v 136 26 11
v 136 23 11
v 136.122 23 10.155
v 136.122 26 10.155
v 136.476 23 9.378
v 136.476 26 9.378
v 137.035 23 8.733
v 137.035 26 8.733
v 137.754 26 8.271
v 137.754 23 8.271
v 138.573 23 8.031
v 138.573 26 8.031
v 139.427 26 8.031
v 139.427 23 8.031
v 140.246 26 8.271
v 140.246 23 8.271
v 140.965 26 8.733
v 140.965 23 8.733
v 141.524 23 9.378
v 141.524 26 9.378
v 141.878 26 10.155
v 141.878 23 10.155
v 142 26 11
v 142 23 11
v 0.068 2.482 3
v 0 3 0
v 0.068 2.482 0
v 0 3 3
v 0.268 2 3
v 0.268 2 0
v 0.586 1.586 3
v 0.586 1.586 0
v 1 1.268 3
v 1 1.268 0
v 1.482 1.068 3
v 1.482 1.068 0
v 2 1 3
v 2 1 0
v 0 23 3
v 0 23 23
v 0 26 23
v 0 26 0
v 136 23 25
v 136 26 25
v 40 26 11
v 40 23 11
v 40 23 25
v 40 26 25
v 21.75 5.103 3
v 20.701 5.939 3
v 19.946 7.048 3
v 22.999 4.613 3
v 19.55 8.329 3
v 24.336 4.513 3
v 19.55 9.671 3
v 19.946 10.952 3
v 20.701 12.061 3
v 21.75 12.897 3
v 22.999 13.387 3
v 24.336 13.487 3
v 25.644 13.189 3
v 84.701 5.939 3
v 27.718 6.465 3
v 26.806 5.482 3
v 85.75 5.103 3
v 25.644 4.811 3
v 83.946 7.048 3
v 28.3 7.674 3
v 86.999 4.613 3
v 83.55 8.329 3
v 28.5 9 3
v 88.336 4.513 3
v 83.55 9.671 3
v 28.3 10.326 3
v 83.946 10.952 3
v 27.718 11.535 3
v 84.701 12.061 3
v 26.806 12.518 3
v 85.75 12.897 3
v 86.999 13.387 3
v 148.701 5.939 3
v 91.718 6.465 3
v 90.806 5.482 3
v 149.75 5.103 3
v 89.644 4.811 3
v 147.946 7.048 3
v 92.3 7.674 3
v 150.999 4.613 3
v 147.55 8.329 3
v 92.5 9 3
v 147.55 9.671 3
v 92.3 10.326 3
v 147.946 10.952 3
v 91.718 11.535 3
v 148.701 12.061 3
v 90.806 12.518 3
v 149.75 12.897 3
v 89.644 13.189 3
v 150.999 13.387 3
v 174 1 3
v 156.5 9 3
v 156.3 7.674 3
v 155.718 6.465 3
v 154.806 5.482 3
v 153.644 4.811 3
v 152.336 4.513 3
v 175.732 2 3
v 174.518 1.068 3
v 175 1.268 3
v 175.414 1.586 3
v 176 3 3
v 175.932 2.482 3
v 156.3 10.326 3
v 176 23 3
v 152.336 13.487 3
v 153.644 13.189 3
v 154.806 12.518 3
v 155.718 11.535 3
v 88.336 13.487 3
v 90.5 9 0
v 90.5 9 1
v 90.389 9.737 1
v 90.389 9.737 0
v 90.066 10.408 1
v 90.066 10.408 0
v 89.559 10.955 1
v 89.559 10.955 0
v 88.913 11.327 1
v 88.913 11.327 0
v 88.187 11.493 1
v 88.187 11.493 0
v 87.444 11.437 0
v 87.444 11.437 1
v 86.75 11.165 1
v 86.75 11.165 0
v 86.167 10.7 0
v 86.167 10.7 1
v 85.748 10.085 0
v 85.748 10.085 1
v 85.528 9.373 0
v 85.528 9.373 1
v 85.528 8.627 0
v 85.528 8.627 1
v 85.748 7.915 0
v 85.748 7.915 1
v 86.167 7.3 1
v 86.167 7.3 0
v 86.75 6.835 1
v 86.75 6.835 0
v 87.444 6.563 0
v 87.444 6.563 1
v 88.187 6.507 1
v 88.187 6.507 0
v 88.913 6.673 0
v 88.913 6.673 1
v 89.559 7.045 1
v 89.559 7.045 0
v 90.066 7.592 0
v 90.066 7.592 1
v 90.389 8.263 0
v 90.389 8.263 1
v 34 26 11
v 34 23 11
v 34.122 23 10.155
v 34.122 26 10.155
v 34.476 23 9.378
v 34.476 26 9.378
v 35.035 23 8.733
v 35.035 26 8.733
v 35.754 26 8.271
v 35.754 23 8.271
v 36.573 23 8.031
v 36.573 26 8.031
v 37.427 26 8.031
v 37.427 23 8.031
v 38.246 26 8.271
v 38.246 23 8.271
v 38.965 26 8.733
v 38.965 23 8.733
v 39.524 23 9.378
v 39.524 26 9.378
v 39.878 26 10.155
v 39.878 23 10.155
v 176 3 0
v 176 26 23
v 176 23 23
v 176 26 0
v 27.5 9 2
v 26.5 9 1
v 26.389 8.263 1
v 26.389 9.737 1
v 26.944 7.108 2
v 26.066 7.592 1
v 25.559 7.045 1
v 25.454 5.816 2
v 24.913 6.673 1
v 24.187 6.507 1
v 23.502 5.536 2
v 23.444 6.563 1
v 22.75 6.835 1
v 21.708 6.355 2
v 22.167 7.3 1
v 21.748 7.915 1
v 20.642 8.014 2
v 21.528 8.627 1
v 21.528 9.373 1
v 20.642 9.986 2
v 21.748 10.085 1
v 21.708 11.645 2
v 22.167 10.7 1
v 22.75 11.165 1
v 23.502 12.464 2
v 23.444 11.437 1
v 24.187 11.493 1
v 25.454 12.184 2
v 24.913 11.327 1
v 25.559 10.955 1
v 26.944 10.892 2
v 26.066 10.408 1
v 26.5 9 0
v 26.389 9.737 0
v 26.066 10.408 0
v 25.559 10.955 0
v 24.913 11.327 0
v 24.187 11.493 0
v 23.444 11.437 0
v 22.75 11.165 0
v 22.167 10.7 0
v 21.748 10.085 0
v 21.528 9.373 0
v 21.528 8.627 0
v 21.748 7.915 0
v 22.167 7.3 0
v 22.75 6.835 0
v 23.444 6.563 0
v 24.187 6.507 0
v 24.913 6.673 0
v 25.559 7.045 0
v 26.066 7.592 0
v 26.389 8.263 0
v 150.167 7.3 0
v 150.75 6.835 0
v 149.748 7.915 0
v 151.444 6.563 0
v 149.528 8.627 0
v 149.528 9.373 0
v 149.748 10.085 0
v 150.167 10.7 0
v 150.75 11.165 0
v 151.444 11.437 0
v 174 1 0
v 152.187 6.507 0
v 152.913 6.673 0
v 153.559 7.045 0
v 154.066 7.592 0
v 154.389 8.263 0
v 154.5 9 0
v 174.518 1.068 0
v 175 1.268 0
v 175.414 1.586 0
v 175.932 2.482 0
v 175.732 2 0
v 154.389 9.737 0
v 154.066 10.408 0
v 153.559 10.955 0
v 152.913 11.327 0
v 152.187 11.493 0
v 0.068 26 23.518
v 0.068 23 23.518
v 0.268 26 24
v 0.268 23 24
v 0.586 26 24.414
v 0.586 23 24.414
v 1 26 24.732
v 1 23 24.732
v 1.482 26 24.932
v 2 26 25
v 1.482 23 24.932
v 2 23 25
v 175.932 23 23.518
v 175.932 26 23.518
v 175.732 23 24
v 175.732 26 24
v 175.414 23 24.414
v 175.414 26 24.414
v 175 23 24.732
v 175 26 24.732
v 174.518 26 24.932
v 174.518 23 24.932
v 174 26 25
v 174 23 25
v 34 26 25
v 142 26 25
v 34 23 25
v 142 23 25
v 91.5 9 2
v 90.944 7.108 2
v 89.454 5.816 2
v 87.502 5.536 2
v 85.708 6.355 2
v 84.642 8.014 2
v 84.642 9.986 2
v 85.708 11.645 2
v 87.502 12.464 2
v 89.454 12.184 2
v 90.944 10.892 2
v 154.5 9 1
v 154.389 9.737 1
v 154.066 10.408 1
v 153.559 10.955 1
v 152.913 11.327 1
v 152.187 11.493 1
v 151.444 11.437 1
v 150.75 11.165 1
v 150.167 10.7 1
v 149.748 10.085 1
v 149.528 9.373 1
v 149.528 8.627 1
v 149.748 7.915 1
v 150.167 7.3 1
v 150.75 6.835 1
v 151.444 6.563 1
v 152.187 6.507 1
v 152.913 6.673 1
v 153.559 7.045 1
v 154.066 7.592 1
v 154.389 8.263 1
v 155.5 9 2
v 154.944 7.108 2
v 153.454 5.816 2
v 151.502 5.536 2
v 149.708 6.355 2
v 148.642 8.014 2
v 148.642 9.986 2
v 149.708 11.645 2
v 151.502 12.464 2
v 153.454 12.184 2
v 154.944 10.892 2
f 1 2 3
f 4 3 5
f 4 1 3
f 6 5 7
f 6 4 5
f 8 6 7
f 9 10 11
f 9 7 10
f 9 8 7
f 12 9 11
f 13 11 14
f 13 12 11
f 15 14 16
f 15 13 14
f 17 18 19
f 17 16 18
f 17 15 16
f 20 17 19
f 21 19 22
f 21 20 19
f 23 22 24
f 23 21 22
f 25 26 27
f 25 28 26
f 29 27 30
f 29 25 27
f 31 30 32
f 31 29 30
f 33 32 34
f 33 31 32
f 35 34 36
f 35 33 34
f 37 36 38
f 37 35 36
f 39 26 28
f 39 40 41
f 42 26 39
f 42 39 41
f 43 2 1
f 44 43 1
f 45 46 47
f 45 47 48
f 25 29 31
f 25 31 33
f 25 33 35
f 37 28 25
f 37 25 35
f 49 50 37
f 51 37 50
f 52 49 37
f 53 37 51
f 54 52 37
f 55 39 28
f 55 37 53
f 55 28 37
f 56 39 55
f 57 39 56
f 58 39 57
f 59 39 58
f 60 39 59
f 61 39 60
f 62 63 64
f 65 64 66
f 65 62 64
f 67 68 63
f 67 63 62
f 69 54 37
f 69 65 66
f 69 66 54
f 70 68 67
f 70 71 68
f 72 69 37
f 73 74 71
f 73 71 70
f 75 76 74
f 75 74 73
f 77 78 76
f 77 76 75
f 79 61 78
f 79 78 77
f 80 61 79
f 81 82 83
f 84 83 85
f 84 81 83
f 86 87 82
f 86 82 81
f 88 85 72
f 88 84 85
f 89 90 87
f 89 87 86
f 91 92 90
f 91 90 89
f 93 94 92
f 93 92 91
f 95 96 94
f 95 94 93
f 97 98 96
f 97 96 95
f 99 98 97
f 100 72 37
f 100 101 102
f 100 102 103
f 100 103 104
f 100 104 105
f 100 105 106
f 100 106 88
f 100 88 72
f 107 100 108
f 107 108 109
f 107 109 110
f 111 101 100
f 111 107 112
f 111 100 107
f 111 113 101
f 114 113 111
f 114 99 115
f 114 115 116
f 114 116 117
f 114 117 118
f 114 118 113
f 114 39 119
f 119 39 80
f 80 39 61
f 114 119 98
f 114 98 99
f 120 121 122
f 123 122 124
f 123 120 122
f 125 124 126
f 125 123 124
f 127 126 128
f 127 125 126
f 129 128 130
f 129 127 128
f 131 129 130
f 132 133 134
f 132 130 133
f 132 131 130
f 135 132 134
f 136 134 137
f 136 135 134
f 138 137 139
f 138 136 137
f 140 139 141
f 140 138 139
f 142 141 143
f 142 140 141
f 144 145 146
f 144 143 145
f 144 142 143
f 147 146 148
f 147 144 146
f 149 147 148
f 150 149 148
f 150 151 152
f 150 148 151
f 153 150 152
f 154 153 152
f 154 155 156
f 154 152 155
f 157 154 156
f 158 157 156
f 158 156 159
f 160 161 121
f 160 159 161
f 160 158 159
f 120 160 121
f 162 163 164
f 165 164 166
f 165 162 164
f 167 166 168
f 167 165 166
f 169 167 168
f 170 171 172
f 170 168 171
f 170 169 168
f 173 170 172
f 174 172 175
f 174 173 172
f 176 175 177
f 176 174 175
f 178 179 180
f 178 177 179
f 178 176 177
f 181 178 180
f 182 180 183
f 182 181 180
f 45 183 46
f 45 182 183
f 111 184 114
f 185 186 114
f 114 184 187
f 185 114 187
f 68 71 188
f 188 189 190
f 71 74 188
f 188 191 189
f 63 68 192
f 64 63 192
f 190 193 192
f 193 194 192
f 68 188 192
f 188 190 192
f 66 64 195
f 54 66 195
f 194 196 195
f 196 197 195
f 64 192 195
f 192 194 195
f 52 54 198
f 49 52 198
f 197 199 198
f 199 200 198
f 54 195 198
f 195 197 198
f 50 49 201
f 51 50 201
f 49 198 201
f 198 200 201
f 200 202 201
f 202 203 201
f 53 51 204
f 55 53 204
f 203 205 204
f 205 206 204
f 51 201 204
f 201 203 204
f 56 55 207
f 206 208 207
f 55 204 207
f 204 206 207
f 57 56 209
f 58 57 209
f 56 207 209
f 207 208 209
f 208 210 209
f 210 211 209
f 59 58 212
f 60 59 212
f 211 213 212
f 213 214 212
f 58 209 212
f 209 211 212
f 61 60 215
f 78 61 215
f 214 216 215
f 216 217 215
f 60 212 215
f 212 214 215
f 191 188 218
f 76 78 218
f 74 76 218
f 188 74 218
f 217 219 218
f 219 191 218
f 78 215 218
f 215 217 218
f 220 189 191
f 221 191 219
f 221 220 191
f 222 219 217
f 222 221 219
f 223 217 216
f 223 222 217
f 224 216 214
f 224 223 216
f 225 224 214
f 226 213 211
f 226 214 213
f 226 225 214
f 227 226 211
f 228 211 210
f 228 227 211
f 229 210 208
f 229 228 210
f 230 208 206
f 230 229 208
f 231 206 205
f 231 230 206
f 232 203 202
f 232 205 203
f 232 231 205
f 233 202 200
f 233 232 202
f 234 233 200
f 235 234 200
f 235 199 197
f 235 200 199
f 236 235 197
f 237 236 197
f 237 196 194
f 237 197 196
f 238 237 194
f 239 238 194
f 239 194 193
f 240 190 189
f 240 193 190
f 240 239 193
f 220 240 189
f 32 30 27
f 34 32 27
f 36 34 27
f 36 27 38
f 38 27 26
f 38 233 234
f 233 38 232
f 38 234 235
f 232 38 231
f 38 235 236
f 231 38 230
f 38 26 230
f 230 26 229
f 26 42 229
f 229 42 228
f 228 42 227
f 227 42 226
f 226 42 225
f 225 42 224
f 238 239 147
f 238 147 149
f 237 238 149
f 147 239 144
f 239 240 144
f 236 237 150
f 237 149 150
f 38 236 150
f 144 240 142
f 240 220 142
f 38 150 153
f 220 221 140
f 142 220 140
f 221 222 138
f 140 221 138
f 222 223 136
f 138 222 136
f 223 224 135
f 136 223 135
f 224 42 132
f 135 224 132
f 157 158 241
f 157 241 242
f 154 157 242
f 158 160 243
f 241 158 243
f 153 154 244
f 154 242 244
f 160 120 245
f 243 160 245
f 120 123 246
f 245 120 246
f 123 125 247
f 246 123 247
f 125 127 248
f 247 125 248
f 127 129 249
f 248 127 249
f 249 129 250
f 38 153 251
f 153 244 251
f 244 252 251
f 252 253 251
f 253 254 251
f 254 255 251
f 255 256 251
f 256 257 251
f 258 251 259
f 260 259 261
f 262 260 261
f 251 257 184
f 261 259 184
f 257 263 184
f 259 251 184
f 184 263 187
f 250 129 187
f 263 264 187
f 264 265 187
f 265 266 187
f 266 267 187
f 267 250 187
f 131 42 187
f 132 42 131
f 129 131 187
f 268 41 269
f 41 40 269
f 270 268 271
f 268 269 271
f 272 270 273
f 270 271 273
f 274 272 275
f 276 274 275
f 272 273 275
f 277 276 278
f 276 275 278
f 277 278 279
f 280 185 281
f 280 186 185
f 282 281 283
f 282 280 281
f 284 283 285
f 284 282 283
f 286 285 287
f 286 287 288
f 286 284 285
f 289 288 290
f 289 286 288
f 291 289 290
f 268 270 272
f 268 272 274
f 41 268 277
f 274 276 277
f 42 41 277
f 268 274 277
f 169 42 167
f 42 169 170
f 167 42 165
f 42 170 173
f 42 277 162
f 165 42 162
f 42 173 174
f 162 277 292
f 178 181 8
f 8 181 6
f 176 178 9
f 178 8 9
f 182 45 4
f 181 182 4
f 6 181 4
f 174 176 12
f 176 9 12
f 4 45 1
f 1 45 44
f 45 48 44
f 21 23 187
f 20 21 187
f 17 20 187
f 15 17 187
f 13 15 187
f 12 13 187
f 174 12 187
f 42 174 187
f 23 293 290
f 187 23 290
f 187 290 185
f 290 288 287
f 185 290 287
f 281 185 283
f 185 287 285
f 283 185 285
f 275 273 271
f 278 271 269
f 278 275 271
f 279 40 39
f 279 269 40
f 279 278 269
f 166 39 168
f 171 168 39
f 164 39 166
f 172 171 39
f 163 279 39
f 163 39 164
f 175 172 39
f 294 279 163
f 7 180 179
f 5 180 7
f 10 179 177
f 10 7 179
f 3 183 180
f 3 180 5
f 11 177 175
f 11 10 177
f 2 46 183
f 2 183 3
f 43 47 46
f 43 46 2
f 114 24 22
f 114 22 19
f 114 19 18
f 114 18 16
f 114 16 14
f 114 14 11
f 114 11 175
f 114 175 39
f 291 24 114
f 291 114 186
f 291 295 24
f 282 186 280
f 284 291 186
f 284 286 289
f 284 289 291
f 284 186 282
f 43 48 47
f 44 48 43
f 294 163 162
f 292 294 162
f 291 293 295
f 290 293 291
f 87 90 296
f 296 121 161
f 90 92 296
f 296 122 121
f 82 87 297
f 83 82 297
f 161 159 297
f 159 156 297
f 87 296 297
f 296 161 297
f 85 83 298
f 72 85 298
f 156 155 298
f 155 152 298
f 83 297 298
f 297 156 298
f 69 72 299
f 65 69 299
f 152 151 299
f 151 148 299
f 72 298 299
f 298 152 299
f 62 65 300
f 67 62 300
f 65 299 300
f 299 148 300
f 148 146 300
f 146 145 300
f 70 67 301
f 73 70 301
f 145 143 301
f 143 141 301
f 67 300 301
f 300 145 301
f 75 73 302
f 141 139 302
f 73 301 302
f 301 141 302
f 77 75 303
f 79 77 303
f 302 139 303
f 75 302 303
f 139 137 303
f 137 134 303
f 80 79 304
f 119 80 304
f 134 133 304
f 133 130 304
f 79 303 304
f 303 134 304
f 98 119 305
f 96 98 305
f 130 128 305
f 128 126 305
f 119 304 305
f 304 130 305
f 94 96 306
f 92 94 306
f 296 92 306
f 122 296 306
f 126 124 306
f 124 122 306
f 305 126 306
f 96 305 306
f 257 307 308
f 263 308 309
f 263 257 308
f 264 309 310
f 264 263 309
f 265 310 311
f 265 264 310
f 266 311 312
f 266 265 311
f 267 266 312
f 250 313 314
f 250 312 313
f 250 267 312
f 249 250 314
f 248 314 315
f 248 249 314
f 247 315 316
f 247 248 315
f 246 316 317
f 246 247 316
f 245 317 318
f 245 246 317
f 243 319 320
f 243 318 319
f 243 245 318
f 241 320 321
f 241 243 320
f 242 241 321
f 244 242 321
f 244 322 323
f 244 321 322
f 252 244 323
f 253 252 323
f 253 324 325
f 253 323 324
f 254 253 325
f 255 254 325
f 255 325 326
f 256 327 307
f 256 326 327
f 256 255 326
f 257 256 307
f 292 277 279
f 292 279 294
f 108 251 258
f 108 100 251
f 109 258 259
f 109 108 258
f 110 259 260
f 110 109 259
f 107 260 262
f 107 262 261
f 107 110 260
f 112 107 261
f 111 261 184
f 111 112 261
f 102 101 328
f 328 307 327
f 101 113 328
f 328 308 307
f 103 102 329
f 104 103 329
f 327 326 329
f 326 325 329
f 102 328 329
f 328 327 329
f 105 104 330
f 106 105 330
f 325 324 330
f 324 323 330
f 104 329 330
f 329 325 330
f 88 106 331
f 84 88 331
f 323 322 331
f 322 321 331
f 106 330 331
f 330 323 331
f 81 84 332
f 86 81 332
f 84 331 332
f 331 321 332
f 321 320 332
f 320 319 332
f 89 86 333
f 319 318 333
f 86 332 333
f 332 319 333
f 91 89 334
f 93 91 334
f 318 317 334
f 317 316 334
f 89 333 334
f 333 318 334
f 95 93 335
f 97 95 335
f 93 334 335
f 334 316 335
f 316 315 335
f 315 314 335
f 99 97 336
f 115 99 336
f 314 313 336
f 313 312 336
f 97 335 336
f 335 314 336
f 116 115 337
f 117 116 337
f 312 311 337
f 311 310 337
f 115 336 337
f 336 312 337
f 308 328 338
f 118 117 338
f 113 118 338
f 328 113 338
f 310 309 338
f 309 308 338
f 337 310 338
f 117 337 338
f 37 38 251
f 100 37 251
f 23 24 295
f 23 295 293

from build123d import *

# Parameters (mm, degrees)
CYLINDER002_R          = 2.5
CYLINDER002_DEPTH      = 10
CYLINDER001_R          = 2.5
CYLINDER001_DEPTH      = 10
CYLINDER_R             = 2.5
CYLINDER_DEPTH         = 10
BOX_W                  = 176
BOX_H                  = 25
BOX_DEPTH              = 3
CHAMFER_SIZE           = 2
FILLET_R               = 2
CYLINDER004_R          = 3
CYLINDER004_DEPTH      = 6
CYLINDER004_ROLL_ANGLE = 90
BOX003_W               = 6
BOX003_H               = 6
BOX003_DEPTH           = 15
CYLINDER003_R          = 3
CYLINDER003_DEPTH      = 6
CYLINDER003_ROLL_ANGLE = 90
BOX002_W               = 6
BOX002_H               = 6
BOX002_DEPTH           = 15
BOX001_W               = 176
BOX001_H               = 25
BOX001_DEPTH           = 3
BOX001_ROLL_ANGLE      = 90
FILLET001_R            = 2


with BuildPart() as cylinder002:
    # Cylinder002 → Cylinder002 (new body)
    with BuildSketch(Plane(origin=(88, 9, 0), x_dir=(1, 0, 0), z_dir=(0, 0, 1))):
        Circle(CYLINDER002_R)
    extrude(amount=CYLINDER002_DEPTH)


with BuildPart() as cylinder001:
    # Cylinder001 → Cylinder001 (new body)
    with BuildSketch(Plane(origin=(152, 9, 0), x_dir=(1, 0, 0), z_dir=(0, 0, 1))):
        Circle(CYLINDER001_R)
    extrude(amount=CYLINDER001_DEPTH)


with BuildPart() as cylinder:
    # Cylinder → Cylinder (new body)
    with BuildSketch(Plane(origin=(24, 9, 0), x_dir=(1, 0, 0), z_dir=(0, 0, 1))):
        Circle(CYLINDER_R)
    extrude(amount=CYLINDER_DEPTH)


with BuildPart() as fillet_body:
    # Box → Box (new body)
    with BuildSketch(Plane(origin=(0, 1, 0), x_dir=(1, 0, 0), z_dir=(0, 0, 1))):
        with Locations((88, 12.5)):
            Rectangle(BOX_W, BOX_H)
    extrude(amount=BOX_DEPTH)

    # Cut: cut Cylinder
    add(cylinder.part, mode=Mode.SUBTRACT)

    # Cut001: cut Cylinder001
    add(cylinder001.part, mode=Mode.SUBTRACT)

    # Cut002: cut Cylinder002
    add(cylinder002.part, mode=Mode.SUBTRACT)

    # Chamfer
    chamfer_edges = [fillet_body.edges().sort_by_distance(p)[0] for p in [
        (85.5, 9, 3),
        (21.5, 9, 3),
        (149.5, 9, 3),
    ]]
    chamfer(chamfer_edges, length=CHAMFER_SIZE)

    # Fillet
    fillet_edges = [fillet_body.edges().sort_by_distance(p)[0] for p in [
        (0, 1, 1.5),
        (176, 1, 1.5),
    ]]
    fillet(fillet_edges, radius=FILLET_R)


with BuildPart() as cylinder004:
    # Cylinder004 → Cylinder004 (new body)
    with BuildSketch(Plane.XY):
        Circle(CYLINDER004_R)
    extrude(amount=CYLINDER004_DEPTH)


with BuildPart() as cylinder004_1:
    # Cylinder004 roll: moved
    add(cylinder004.part.rotate(Axis((0, 0, 0), (1, 0, 0)), CYLINDER004_ROLL_ANGLE))


with BuildPart() as cylinder004_2:
    # Cylinder004 placement: moved
    add(cylinder004_1.part.moved(Location((36, 6, 0))))


with BuildPart() as fusion001:
    # Box003 → Box003 (new body)
    with BuildSketch(Plane(origin=(33, 0, 0), x_dir=(1, 0, 0), z_dir=(0, 0, 1))):
        with Locations((3, 3)):
            Rectangle(BOX003_W, BOX003_H)
    extrude(amount=BOX003_DEPTH)

    # Fusion001: union Cylinder004
    add(cylinder004_2.part)


with BuildPart() as fusion001_1:
    # Fusion001 placement: moved
    add(fusion001.part.moved(Location((103, 22, 11))))


with BuildPart() as cylinder003:
    # Cylinder003 → Cylinder003 (new body)
    with BuildSketch(Plane.XY):
        Circle(CYLINDER003_R)
    extrude(amount=CYLINDER003_DEPTH)


with BuildPart() as cylinder003_1:
    # Cylinder003 roll: moved
    add(cylinder003.part.rotate(Axis((0, 0, 0), (1, 0, 0)), CYLINDER003_ROLL_ANGLE))


with BuildPart() as cylinder003_2:
    # Cylinder003 placement: moved
    add(cylinder003_1.part.moved(Location((36, 6, 0))))


with BuildPart() as fusion:
    # Box002 → Box002 (new body)
    with BuildSketch(Plane(origin=(33, 0, 0), x_dir=(1, 0, 0), z_dir=(0, 0, 1))):
        with Locations((3, 3)):
            Rectangle(BOX002_W, BOX002_H)
    extrude(amount=BOX002_DEPTH)

    # Fusion: union Cylinder003
    add(cylinder003_2.part)


with BuildPart() as fusion_1:
    # Fusion placement: moved
    add(fusion.part.moved(Location((1, 22, 11))))


with BuildPart() as f_4u_ears:
    # Box001 → Box001 (new body)
    with BuildSketch(Plane.XY):
        with Locations((88, 12.5)):
            Rectangle(BOX001_W, BOX001_H)
    extrude(amount=BOX001_DEPTH)


with BuildPart() as f_4u_ears_1:
    # Box001 roll: moved
    add(f_4u_ears.part.rotate(Axis((0, 0, 0), (1, 0, 0)), BOX001_ROLL_ANGLE))


with BuildPart() as f_4u_ears_2:
    # Box001 placement: moved
    add(f_4u_ears_1.part.moved(Location((0, 26, 0))))

    # Cut003: cut Fusion
    add(fusion_1.part, mode=Mode.SUBTRACT)

    # Cut004: cut Fusion001
    add(fusion001_1.part, mode=Mode.SUBTRACT)

    # Fillet001
    fillet001_edges = [f_4u_ears_2.edges().sort_by_distance(p)[0] for p in [
        (0, 24.5, 25),
        (176, 24.5, 25),
    ]]
    fillet(fillet001_edges, radius=FILLET001_R)

    # Fusion002: union Fillet body
    add(fillet_body.part)


solid = f_4u_ears_2.part
